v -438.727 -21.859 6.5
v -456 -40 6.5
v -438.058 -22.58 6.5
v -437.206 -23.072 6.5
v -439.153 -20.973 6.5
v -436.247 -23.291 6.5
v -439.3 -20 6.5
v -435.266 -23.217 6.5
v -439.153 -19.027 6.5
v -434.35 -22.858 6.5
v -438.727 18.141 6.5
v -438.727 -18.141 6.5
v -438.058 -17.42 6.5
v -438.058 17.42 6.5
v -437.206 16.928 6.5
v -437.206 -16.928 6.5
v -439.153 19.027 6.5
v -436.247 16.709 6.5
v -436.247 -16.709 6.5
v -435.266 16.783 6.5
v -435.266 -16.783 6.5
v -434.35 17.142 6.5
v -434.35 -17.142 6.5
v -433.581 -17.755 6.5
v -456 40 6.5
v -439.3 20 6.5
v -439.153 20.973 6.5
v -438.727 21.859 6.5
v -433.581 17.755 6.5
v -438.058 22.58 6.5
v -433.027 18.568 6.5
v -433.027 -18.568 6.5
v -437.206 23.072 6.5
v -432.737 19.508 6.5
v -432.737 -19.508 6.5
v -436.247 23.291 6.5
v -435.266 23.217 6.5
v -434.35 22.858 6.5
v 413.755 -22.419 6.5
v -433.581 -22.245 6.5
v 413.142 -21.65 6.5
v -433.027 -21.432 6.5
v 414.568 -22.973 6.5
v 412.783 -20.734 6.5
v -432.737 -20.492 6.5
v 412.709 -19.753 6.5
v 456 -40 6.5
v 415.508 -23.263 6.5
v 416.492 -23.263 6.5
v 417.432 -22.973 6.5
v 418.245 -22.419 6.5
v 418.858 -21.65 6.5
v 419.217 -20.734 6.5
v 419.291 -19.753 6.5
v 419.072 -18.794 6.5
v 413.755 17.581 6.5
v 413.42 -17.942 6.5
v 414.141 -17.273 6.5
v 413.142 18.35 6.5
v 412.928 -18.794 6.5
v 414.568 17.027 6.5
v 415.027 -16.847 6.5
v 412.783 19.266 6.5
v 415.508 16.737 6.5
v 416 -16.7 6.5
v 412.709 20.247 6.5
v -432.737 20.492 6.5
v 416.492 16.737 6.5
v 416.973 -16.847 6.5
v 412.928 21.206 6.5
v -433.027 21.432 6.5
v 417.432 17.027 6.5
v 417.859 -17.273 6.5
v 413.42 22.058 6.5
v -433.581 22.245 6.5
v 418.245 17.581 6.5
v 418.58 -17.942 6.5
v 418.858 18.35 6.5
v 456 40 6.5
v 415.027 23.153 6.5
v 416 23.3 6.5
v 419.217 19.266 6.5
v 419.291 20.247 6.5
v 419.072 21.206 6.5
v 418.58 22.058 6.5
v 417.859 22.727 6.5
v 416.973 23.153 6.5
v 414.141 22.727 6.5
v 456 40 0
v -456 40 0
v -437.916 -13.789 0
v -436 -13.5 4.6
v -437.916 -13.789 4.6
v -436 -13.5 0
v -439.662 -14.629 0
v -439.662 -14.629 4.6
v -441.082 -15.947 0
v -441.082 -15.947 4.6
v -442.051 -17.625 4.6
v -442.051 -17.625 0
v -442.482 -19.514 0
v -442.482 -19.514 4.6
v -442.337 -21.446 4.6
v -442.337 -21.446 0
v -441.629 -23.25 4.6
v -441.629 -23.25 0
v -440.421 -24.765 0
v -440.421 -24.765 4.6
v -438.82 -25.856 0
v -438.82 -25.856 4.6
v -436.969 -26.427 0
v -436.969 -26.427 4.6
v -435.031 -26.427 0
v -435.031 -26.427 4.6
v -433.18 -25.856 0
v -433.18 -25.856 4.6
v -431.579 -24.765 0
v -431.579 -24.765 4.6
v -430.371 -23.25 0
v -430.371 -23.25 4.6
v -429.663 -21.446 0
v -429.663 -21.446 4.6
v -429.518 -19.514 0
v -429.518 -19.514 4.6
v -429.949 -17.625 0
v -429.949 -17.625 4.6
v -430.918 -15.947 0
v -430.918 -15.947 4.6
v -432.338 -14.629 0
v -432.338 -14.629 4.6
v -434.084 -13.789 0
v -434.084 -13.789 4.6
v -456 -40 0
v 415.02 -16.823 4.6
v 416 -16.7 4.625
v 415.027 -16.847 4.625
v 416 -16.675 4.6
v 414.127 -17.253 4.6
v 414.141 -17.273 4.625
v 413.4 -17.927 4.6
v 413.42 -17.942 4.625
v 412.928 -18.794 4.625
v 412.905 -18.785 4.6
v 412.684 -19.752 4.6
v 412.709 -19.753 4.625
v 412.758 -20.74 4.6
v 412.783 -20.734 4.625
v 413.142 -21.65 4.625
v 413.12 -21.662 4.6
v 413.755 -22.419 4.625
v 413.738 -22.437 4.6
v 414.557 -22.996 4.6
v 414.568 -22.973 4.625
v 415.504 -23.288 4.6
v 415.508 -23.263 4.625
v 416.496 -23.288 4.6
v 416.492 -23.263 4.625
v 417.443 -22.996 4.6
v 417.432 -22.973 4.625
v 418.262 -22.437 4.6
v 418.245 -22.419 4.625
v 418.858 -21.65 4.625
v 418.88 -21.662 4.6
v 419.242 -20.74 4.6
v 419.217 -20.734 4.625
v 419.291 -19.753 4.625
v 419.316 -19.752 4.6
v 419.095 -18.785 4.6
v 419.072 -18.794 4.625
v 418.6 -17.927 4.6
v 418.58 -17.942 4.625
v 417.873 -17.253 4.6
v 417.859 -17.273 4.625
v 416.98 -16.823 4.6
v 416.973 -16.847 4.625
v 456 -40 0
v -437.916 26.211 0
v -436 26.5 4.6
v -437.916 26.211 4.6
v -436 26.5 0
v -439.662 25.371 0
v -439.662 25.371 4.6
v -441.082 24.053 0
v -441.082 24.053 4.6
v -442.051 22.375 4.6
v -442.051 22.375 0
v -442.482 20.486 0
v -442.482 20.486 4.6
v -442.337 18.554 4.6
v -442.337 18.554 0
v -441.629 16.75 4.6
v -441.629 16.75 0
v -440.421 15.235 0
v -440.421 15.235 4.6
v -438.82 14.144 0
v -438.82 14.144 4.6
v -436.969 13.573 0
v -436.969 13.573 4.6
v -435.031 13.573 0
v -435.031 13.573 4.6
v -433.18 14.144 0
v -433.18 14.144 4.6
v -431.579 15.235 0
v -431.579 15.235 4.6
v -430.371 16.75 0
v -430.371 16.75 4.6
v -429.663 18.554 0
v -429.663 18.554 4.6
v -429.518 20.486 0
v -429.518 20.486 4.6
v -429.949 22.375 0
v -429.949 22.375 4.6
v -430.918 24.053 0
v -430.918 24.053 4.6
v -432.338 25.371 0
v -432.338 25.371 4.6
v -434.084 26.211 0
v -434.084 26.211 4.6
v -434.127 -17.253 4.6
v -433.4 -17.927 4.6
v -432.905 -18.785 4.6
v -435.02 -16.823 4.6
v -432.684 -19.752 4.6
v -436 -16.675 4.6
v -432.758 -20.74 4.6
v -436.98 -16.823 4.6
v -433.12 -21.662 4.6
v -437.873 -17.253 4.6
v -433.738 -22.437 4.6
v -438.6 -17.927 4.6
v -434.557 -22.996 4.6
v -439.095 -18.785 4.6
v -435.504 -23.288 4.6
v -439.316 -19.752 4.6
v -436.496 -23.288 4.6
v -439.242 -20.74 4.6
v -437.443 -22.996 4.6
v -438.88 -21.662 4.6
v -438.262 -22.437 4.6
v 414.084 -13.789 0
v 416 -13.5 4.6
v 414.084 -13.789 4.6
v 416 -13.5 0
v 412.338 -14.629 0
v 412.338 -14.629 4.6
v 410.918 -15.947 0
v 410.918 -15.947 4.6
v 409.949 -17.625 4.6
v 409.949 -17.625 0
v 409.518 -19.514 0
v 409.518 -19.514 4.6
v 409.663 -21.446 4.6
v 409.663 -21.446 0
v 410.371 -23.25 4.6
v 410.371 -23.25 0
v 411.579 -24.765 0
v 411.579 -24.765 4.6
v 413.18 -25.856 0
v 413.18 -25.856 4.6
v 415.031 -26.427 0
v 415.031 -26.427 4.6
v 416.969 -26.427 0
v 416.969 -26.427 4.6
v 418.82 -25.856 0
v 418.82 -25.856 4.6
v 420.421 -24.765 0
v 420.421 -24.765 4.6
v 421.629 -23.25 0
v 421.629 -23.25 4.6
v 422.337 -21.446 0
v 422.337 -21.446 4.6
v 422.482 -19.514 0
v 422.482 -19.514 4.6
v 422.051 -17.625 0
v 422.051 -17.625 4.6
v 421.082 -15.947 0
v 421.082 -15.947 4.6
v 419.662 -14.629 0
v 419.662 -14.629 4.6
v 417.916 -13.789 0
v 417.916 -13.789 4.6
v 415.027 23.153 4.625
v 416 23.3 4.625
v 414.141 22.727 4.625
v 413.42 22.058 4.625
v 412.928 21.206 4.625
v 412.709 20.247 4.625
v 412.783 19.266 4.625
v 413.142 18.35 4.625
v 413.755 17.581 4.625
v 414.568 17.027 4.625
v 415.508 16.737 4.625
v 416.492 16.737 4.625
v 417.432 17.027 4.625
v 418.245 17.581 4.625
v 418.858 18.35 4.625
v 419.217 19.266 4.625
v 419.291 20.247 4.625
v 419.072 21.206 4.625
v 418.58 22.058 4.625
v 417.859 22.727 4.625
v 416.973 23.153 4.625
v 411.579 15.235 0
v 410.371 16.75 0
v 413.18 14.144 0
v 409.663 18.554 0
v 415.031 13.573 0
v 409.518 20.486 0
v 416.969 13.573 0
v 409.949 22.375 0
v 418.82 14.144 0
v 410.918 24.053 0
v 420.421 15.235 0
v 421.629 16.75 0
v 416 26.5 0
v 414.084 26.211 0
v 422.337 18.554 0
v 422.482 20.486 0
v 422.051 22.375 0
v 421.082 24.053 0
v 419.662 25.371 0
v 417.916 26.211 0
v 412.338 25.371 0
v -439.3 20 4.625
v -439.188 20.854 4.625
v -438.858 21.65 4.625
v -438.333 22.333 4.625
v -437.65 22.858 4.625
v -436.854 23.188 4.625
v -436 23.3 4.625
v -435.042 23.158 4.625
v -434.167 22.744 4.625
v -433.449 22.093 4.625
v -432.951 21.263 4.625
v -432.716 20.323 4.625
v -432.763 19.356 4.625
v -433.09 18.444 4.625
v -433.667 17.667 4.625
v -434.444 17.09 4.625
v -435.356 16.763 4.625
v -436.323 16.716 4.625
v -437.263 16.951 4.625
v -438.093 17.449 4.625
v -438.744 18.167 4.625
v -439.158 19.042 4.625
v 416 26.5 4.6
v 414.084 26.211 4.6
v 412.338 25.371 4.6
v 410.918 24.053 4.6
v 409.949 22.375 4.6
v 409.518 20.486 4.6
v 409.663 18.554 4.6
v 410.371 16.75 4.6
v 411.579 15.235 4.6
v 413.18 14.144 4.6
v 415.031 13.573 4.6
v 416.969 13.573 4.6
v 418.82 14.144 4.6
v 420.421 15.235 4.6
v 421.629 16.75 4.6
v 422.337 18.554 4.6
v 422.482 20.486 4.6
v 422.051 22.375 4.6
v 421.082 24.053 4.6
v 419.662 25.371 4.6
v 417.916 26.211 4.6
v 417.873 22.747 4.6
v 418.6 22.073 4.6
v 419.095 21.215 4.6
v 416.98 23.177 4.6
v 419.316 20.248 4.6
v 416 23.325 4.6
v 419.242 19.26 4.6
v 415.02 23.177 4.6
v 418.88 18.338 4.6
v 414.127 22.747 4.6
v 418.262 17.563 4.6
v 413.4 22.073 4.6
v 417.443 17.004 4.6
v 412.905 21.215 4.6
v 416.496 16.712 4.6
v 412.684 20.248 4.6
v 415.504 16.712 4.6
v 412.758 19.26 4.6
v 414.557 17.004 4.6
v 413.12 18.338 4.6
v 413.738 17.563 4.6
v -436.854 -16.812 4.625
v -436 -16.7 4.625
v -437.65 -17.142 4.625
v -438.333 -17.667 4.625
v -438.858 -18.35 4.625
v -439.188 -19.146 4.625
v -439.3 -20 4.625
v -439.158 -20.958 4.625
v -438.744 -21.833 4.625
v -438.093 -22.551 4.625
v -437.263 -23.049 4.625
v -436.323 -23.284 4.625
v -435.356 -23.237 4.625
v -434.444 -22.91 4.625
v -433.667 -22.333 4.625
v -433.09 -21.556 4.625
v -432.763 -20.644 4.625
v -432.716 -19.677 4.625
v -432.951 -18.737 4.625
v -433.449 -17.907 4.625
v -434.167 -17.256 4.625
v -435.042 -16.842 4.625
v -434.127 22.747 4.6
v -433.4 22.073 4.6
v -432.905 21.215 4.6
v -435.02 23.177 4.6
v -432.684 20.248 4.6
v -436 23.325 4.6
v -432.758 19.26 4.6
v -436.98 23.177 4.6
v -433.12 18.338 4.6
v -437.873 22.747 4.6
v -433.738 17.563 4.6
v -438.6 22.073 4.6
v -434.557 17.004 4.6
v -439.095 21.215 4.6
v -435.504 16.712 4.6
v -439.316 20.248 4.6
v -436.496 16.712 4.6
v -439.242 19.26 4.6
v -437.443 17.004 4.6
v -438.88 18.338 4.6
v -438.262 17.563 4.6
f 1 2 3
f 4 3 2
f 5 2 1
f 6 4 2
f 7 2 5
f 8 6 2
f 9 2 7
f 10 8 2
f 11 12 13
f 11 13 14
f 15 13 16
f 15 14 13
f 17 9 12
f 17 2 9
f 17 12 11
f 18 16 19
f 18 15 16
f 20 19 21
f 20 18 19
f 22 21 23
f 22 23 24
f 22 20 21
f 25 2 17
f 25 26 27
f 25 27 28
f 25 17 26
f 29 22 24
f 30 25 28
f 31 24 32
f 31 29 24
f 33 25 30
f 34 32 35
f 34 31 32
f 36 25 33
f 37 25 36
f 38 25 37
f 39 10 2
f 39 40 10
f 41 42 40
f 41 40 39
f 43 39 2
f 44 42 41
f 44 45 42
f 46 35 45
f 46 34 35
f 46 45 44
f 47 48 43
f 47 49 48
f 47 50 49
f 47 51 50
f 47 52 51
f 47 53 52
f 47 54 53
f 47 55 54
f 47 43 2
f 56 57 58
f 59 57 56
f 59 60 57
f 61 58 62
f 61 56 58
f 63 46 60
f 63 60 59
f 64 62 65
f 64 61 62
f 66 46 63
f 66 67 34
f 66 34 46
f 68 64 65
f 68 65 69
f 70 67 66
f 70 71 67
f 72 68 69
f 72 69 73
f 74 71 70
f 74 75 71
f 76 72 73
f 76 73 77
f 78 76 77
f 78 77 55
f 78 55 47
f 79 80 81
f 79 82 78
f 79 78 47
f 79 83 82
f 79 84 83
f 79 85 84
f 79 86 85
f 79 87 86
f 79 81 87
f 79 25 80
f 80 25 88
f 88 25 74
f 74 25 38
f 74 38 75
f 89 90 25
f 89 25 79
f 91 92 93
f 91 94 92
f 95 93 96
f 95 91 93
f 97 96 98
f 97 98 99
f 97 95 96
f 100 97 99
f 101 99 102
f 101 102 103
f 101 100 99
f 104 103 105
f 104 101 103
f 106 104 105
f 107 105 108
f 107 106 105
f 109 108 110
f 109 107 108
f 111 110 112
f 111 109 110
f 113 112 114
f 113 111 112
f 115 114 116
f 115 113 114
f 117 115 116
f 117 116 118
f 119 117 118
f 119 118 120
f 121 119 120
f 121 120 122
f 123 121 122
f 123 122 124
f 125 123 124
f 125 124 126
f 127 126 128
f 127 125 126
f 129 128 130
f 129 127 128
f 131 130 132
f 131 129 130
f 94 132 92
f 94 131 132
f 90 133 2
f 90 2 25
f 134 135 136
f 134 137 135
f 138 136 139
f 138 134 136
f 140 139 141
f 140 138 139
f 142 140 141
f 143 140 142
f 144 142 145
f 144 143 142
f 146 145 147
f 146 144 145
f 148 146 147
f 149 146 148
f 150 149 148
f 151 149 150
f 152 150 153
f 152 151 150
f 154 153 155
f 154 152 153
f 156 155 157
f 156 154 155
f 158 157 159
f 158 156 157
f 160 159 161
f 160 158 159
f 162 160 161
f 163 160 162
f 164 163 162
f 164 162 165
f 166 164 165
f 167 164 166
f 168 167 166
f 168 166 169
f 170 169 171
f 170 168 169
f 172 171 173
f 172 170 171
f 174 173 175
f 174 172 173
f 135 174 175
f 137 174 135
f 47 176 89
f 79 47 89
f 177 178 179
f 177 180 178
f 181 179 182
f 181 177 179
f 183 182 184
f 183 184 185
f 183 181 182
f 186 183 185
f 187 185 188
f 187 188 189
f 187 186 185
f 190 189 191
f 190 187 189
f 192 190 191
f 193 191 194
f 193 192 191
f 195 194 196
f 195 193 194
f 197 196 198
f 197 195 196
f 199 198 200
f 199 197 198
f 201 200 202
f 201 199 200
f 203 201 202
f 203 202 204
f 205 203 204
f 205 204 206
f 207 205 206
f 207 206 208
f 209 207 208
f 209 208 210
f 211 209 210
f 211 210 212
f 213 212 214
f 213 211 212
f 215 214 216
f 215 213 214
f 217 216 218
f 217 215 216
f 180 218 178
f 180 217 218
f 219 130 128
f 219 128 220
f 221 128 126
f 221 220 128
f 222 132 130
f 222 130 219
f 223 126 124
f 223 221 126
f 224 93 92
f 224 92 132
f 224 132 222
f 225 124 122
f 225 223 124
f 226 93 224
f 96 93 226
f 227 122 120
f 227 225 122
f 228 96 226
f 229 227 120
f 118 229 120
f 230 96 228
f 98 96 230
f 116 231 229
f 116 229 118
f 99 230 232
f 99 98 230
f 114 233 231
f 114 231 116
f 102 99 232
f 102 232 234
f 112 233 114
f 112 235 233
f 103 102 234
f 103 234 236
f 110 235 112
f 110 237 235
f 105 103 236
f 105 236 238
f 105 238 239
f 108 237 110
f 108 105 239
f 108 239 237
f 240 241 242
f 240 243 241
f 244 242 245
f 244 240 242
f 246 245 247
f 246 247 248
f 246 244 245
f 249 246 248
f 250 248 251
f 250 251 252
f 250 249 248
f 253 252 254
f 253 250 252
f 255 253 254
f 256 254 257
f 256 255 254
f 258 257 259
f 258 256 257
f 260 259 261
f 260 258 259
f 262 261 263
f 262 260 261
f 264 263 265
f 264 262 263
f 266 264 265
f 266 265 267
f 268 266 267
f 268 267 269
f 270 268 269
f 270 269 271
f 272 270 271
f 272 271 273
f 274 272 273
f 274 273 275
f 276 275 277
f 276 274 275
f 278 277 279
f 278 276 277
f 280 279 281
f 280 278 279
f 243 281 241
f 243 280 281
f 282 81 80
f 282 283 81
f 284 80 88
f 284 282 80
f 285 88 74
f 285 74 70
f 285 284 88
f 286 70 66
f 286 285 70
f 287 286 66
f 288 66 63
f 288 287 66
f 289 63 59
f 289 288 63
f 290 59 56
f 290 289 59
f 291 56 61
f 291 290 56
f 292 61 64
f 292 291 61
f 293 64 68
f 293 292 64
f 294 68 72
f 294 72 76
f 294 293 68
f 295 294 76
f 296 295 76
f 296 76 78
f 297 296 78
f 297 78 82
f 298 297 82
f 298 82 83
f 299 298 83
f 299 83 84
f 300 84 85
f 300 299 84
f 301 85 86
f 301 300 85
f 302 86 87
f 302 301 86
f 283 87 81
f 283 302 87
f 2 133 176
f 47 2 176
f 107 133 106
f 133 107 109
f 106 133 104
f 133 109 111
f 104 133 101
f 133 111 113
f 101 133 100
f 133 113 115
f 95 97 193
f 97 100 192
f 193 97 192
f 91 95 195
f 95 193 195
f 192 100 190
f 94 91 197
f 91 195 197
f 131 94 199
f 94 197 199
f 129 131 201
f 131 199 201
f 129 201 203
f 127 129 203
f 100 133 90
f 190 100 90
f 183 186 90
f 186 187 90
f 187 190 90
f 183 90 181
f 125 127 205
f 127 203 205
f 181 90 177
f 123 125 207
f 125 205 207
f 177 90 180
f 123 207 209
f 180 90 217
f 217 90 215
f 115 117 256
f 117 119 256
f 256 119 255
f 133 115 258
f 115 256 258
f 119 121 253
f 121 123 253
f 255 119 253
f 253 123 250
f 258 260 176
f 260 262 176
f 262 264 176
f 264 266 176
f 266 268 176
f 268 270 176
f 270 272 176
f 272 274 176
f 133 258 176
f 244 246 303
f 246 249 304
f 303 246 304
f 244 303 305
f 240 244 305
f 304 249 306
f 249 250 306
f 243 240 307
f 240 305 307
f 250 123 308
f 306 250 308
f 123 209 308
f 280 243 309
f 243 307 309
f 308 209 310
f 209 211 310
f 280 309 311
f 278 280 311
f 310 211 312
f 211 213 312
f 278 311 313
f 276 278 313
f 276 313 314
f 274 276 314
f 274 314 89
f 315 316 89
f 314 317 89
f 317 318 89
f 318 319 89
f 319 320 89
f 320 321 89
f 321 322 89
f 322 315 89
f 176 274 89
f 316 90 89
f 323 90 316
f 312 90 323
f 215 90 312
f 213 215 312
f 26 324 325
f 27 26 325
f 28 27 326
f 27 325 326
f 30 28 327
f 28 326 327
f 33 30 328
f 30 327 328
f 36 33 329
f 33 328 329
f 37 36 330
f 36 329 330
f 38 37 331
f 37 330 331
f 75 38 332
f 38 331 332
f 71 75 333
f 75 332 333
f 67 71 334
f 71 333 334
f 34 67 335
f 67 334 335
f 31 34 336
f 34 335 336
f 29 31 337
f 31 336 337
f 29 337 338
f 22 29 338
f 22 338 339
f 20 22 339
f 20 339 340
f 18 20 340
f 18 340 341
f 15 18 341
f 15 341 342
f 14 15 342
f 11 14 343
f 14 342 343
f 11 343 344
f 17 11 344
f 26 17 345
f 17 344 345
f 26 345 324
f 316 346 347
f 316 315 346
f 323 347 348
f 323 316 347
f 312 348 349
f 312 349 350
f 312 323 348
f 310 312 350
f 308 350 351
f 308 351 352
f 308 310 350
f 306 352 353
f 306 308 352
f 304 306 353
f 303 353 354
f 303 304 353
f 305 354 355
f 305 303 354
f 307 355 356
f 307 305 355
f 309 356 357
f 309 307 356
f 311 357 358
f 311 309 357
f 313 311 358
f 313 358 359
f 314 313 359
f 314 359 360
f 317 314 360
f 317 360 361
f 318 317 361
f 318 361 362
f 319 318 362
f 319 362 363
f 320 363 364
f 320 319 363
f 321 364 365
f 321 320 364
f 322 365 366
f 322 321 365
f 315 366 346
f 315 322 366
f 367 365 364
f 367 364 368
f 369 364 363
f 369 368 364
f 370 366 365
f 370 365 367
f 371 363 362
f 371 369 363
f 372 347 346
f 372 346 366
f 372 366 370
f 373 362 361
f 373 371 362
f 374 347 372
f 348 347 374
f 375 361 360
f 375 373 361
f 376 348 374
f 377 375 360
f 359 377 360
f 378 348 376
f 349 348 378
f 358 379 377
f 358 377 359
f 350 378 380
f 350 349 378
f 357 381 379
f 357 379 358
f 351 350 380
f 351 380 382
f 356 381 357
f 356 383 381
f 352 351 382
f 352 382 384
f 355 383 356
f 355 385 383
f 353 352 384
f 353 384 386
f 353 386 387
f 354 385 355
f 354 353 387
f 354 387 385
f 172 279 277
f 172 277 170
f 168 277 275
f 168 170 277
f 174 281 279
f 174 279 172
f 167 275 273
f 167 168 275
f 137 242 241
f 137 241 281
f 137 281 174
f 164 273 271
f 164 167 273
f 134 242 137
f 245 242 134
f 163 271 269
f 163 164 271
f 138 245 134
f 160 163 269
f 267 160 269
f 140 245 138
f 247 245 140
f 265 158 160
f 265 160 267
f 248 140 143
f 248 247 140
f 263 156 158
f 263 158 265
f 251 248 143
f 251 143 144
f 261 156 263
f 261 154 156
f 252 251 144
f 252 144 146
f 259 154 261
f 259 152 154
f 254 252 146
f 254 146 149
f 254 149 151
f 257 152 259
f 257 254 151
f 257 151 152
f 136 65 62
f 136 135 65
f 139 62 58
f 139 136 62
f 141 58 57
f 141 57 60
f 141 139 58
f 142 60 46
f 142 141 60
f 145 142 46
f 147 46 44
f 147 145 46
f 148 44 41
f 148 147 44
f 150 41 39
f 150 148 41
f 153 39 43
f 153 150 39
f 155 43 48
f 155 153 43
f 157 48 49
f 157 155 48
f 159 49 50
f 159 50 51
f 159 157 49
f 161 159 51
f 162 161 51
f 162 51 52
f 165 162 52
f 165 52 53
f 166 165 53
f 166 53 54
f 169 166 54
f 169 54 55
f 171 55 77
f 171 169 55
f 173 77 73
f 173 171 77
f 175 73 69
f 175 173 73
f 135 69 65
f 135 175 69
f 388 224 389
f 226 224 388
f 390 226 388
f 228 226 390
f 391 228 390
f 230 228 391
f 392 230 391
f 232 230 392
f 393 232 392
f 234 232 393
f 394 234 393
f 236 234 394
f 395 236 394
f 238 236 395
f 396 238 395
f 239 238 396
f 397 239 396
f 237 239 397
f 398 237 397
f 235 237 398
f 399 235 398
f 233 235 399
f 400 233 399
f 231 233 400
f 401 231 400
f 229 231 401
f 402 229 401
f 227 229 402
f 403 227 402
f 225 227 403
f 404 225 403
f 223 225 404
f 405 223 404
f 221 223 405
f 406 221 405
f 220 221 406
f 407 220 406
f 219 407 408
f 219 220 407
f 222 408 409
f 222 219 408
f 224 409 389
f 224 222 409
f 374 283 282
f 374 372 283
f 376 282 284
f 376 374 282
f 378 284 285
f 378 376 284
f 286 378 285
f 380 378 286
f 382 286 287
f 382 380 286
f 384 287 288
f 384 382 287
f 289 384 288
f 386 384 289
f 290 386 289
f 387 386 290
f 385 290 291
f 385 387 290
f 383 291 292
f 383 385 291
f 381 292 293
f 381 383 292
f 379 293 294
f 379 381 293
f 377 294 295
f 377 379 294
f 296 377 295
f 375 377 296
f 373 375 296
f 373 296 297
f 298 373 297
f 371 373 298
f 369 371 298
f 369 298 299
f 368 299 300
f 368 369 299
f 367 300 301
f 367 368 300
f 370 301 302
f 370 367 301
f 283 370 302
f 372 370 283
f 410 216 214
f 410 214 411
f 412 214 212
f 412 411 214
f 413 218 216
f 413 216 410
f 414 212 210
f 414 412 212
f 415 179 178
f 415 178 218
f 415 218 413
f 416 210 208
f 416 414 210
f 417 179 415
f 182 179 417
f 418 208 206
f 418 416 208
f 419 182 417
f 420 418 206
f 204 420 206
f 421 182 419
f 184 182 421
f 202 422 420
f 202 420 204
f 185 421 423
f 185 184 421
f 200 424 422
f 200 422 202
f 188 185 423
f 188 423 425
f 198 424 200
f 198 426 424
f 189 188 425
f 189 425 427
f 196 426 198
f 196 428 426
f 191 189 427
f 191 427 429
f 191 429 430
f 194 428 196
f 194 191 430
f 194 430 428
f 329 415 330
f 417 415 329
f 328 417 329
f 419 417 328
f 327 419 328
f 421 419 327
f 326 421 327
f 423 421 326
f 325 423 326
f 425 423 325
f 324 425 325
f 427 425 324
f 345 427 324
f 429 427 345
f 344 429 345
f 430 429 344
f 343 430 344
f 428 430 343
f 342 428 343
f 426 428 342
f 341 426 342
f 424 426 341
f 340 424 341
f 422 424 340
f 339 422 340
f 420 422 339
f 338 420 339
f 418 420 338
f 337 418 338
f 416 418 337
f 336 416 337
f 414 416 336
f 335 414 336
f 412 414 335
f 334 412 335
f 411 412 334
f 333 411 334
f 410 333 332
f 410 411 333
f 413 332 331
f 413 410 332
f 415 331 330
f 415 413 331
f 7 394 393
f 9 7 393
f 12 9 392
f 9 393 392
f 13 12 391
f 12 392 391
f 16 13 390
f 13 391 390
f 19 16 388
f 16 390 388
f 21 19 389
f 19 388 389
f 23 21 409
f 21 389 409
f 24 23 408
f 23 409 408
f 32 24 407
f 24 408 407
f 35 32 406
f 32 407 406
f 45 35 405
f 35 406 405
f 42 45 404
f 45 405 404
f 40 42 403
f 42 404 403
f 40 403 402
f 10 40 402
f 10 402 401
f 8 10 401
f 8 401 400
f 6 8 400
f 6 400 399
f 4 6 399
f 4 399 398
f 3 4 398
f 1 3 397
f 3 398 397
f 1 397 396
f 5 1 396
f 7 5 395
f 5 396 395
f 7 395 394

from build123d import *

# Parameters (mm, degrees)
ESQUISSE1_W                                = 912
ESQUISSE1_H                                = 80
BOSS_EXTRU_1_DEPTH                         = 6.5
D_GAGEMENT_M61_D                           = 6.6
CHAMBRAGE_POUR_VIS_T_TE_RONDE_BOMB_2_COUNT = 2
CHAMBRAGE_POUR_VIS_T_TE_RONDE_BOMB_2_PITCH = 40
R_P_TITION_LIN_AIRE1_COUNT                 = 2
R_P_TITION_LIN_AIRE1_PITCH                 = 852


with BuildPart() as part:
    # Esquisse1 → Boss.-Extru.1 (new body)
    with BuildSketch(Plane.XY):
        Rectangle(ESQUISSE1_W, ESQUISSE1_H)
    extrude(amount=BOSS_EXTRU_1_DEPTH)

    # Dégagement M61 (through all)
    with Locations(Plane.XY.offset(6.5)):
        with Locations((-436, 20), (-436, -20)):
            Hole(D_GAGEMENT_M61_D / 2)

    # Esquisse4 → Chambrage pour vis à tête ronde bombée M61 (revolve, cut)
    with BuildSketch(Plane(origin=(-436, 20, 0), x_dir=(0, 1, 0), z_dir=(1, 0, 0))):
        Polygon((0, 0), (0, 6.5), (3.3, 6.5), (3.3, 4.625), (3.325, 4.6), (6.5, 4.6), (6.5, 0), align=None)
    chambrage_pour_vis_t_te_ronde_bomb_e_m = revolve(axis=Axis((-436, 20, -6.35), (0, 0, 1)), mode=Mode.SUBTRACT)

    # Chambrage pour vis _ t_te ronde bomb 2: Chambrage pour vis à tête ronde bombée M61 ×2
    with Locations(*[(0, -i * CHAMBRAGE_POUR_VIS_T_TE_RONDE_BOMB_2_PITCH, 0) for i in range(1, CHAMBRAGE_POUR_VIS_T_TE_RONDE_BOMB_2_COUNT)]):
        add(chambrage_pour_vis_t_te_ronde_bomb_e_m, mode=Mode.SUBTRACT)

    # Répétition linéaire1: Chambrage pour vis à tête ronde bombée M61 ×2
    with Locations(*[(i * R_P_TITION_LIN_AIRE1_PITCH, 0, 0) for i in range(1, R_P_TITION_LIN_AIRE1_COUNT)]):
        add(chambrage_pour_vis_t_te_ronde_bomb_e_m, mode=Mode.SUBTRACT)

    # Répétition linéaire1 copy 1 sketch → Répétition linéaire1 copy 1 (revolve, cut)
    with BuildSketch(Plane(origin=(416, -20, 0), x_dir=(0, 1, 0), z_dir=(1, 0, 0))):
        Polygon((0, 0), (0, 6.5), (3.3, 6.5), (3.3, 4.625), (3.325, 4.6), (6.5, 4.6), (6.5, 0), align=None)
    revolve(axis=Axis((416, -20, -6.35), (0, 0, 1)), mode=Mode.SUBTRACT)


solid = part.part
